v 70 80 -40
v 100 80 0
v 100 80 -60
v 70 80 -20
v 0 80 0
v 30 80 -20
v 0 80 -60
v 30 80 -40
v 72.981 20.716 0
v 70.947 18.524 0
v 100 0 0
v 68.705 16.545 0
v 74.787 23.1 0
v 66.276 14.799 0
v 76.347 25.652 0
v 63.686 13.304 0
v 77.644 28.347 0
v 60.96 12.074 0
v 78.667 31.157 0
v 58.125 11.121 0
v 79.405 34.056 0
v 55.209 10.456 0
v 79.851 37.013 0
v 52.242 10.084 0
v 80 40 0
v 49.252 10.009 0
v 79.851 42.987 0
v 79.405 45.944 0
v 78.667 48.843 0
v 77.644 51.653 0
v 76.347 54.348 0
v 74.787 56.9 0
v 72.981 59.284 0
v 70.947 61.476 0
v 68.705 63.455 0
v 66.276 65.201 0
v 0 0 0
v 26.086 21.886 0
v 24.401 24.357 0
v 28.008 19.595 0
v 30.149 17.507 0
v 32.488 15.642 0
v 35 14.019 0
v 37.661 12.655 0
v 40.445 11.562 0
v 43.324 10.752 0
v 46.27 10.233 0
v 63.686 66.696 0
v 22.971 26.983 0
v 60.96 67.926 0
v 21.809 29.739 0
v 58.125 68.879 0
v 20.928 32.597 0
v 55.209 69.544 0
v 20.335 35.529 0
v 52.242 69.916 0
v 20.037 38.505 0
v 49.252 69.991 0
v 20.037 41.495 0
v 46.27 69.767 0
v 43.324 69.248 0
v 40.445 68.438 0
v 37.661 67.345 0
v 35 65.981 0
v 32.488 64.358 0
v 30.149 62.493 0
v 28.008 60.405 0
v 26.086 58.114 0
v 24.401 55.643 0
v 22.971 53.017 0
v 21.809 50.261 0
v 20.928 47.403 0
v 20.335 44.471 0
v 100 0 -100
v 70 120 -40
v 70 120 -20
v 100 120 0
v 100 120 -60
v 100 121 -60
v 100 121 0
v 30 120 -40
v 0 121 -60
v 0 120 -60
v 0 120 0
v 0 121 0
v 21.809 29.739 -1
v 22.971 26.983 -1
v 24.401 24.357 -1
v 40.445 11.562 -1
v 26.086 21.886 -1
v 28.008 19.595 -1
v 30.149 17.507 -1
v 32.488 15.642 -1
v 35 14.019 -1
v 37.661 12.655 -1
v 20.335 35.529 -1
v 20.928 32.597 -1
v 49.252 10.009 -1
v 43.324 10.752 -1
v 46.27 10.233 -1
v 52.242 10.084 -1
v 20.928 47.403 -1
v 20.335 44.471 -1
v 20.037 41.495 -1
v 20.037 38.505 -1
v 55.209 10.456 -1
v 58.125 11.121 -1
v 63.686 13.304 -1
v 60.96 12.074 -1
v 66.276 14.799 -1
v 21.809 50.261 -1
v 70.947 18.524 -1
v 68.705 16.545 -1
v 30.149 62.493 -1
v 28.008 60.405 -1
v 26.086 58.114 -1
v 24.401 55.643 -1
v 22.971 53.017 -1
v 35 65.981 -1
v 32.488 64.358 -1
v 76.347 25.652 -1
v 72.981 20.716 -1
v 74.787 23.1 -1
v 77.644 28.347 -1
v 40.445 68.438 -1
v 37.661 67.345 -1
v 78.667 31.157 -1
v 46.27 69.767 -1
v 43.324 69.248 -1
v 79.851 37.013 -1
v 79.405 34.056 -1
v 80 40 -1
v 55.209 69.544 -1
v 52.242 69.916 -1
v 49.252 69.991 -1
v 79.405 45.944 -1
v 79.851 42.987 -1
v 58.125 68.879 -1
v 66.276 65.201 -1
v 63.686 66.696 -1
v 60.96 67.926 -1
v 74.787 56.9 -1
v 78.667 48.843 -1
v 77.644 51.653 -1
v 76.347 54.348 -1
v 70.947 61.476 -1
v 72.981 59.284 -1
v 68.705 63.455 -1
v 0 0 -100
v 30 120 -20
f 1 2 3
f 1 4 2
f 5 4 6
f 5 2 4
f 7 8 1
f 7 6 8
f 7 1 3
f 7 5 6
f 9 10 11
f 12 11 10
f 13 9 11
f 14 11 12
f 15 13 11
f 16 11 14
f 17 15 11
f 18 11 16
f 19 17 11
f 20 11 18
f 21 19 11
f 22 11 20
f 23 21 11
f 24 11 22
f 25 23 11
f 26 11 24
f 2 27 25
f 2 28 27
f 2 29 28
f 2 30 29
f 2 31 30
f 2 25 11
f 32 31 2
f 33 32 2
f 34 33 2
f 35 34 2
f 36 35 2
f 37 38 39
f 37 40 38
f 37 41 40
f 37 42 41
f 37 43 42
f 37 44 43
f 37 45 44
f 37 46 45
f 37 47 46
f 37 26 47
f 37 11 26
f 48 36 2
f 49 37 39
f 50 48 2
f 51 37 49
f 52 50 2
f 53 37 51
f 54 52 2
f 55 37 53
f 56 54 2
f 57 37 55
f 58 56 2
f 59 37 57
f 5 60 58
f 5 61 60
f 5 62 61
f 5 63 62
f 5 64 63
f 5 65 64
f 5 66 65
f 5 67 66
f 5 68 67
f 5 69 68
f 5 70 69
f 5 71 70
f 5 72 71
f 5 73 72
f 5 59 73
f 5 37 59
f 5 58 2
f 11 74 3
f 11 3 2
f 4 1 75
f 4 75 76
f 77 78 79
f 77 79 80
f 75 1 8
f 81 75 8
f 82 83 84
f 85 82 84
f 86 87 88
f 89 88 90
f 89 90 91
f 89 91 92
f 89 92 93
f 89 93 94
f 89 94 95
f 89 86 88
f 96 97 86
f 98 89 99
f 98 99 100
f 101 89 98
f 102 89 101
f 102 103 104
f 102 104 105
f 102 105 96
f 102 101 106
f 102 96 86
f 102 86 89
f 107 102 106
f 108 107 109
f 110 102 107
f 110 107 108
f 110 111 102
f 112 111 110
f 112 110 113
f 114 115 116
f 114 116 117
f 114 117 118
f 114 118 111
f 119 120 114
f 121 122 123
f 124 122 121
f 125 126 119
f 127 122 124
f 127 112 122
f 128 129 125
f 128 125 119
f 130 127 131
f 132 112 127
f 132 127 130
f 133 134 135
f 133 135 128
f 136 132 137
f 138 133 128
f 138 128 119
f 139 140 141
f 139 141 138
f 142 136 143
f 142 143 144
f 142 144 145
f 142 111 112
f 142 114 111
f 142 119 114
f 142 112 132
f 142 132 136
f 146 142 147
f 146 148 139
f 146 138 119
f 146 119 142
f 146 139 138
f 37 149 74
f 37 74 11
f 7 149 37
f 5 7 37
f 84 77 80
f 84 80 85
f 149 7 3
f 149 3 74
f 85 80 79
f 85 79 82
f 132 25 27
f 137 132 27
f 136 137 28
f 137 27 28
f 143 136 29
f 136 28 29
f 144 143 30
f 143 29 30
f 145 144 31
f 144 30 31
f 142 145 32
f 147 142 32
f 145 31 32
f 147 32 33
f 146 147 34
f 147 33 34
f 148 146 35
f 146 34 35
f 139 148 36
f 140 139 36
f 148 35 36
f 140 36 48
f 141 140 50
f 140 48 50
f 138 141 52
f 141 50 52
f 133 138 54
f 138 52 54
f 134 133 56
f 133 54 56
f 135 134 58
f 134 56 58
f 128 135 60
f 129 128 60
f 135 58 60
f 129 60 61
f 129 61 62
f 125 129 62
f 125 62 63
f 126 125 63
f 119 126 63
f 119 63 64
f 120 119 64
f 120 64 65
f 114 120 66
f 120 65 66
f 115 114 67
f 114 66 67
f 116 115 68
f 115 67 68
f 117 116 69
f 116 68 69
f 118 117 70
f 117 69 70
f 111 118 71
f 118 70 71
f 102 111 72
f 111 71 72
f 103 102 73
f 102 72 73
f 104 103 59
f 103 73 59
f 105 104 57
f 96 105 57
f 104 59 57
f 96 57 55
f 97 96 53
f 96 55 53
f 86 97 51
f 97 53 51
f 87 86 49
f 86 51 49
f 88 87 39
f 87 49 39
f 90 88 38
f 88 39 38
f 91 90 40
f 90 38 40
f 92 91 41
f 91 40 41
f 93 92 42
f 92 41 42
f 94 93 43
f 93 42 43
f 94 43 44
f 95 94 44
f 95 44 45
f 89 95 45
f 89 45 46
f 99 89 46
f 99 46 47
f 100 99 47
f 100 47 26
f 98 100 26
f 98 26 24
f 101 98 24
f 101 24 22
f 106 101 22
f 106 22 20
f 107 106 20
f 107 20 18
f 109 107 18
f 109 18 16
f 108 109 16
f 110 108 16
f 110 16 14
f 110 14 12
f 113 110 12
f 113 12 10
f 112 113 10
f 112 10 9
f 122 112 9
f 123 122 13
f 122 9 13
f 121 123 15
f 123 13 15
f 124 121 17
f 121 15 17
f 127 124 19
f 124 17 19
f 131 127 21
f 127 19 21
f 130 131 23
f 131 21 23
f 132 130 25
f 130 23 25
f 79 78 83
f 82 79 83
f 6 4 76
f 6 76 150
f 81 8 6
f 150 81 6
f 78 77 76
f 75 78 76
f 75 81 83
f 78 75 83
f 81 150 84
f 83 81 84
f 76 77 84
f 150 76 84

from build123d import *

# Parameters (mm, degrees)
EXTRUDE1_DEPTH     = 100
SKETCH2_R          = 30
CUT_EXTRUDE1_DEPTH = 1
SKETCH3_W          = 40
SKETCH3_H          = 20
EXTRUDE2_DEPTH     = 40
SKETCH4_W          = 100
SKETCH4_H          = 60
EXTRUDE3_DEPTH     = 1


with BuildPart() as part:
    # Sketch1 → Extrude1 (new body)
    with BuildSketch(Plane(origin=(0, 0, 0), x_dir=(0, 0, -1), z_dir=(1, 0, 0))):
        Polygon((100, 0), (0, 0), (0, 80), (60, 80), align=None)
    extrude(amount=EXTRUDE1_DEPTH)

    # Sketch2 → Cut-Extrude1 (cut)
    with BuildSketch(Plane.XY):
        with Locations((50, 40)):
            Circle(SKETCH2_R)
    extrude(amount=-CUT_EXTRUDE1_DEPTH, mode=Mode.SUBTRACT)

    # Sketch3 → Extrude2 (add)
    with BuildSketch(Plane(origin=(0, 80, 0), x_dir=(-1, 0, 0), z_dir=(0, 1, 0))):
        with Locations((-50, -30)):
            Rectangle(SKETCH3_W, SKETCH3_H)
    extrude(amount=EXTRUDE2_DEPTH)

    # Sketch4 → Extrude3 (add)
    with BuildSketch(Plane(origin=(0, 120, 0), x_dir=(-1, 0, 0), z_dir=(0, 1, 0))):
        with Locations((-50, -30)):
            Rectangle(SKETCH4_W, SKETCH4_H)
    extrude(amount=EXTRUDE3_DEPTH)


solid = part.part
